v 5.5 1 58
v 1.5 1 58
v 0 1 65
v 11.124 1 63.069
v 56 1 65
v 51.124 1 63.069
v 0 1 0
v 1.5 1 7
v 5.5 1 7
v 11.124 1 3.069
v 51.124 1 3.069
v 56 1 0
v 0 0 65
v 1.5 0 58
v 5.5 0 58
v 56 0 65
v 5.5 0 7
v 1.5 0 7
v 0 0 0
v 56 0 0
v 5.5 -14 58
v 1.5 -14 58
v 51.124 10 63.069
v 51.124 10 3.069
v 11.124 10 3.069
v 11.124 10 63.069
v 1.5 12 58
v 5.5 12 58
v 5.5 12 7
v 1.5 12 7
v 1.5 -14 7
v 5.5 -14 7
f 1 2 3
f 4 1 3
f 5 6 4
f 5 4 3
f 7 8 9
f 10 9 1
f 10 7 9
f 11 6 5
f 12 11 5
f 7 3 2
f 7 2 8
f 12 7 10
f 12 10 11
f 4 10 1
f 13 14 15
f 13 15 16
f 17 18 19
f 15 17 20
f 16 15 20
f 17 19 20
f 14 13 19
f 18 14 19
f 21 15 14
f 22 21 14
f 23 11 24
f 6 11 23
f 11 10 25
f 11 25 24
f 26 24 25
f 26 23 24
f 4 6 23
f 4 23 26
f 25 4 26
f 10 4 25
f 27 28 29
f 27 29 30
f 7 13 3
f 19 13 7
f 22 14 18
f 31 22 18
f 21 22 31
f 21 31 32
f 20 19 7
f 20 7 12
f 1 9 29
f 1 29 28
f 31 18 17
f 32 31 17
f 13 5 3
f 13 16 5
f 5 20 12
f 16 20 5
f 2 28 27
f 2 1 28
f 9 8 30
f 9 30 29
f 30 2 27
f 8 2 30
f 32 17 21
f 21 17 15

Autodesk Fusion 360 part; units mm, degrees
sketch "Sketch1" plane through (0, 0, 0) normal (0, 1, 0) x (1, 0, 0)
  line L0 (0, 0) -> (56, 0)
  line L1 (56, 0) -> (56, -65)
  line L2 (56, -65) -> (0, -65)
  line L3 (0, -65) -> (0, 0)
  dimension "d1" = 56
  dimension "d2" = 65
extrude "Extrude1" add sketch "Sketch1" along normal blind 1
sketch "Sketch2" plane through (0, 1, 0) normal (0, 1, 0) x (-1, 0, 0)
  line L0 (0, 65) -> (-56, 65)
  line L1 (-56, 65) -> (-56, 0)
  line L2 (-56, 0) -> (0, 0)
  line L3 (0, 0) -> (0, 65)
  line L4 (-1.5, 7) -> (-5.5, 7)
  line L5 (-5.5, 7) -> (-5.5, 58)
  line L6 (-5.5, 58) -> (-1.5, 58)
  line L7 (-1.5, 58) -> (-1.5, 7)
  dimension "d5" = 4
  dimension "d6" = 51
  dimension "d7" = 7
  dimension "d8" = 7
  dimension "d9" = 1.5
extrude "Extrude2" add sketch "Sketch2" along normal blind 11 contours L4 L5 L6 L7
sketch "Sketch3" plane through (0, 0, 0) normal (0, -1, 0) x (1, 0, 0)
  line L0 (56, 65) -> (0, 65)
  line L1 (0, 65) -> (0, 0)
  line L2 (0, 0) -> (56, 0)
  line L3 (56, 0) -> (56, 65)
  line L4 (1.5, 7) -> (5.5, 7)
  line L5 (5.5, 7) -> (5.5, 58)
  line L6 (5.5, 58) -> (1.5, 58)
  line L7 (1.5, 58) -> (1.5, 7)
extrude "Extrude3" add sketch "Sketch3" along normal blind 14 contours L4 L5 L6 L7
sketch "Sketch4" plane through (0, 1, 0) normal (0, 1, 0) x (-1, 0, 0)
  line L0 (-1.5, 58) -> (-1.5, 7)
  line L1 (-1.5, 7) -> (-5.5, 7)
  line L2 (-5.5, 7) -> (-5.5, 58)
  line L3 (-5.5, 58) -> (-1.5, 58)
  line L4 (0, 65) -> (-56, 65)
  line L5 (-56, 65) -> (-56, 0)
  line L6 (-56, 0) -> (0, 0)
  line L7 (0, 0) -> (0, 65)
  line L8 (-11.1237, 3.0691) -> (-51.1237, 3.0691)
  line L9 (-51.1237, 3.0691) -> (-51.1237, 63.0691)
  line L10 (-51.1237, 63.0691) -> (-11.1237, 63.0691)
  line L11 (-11.1237, 63.0691) -> (-11.1237, 3.0691)
  dimension "d14" = 40
  dimension "d15" = 60
extrude "Extrude4" add sketch "Sketch4" along normal blind 9 contours L8 L9 L10 L11
